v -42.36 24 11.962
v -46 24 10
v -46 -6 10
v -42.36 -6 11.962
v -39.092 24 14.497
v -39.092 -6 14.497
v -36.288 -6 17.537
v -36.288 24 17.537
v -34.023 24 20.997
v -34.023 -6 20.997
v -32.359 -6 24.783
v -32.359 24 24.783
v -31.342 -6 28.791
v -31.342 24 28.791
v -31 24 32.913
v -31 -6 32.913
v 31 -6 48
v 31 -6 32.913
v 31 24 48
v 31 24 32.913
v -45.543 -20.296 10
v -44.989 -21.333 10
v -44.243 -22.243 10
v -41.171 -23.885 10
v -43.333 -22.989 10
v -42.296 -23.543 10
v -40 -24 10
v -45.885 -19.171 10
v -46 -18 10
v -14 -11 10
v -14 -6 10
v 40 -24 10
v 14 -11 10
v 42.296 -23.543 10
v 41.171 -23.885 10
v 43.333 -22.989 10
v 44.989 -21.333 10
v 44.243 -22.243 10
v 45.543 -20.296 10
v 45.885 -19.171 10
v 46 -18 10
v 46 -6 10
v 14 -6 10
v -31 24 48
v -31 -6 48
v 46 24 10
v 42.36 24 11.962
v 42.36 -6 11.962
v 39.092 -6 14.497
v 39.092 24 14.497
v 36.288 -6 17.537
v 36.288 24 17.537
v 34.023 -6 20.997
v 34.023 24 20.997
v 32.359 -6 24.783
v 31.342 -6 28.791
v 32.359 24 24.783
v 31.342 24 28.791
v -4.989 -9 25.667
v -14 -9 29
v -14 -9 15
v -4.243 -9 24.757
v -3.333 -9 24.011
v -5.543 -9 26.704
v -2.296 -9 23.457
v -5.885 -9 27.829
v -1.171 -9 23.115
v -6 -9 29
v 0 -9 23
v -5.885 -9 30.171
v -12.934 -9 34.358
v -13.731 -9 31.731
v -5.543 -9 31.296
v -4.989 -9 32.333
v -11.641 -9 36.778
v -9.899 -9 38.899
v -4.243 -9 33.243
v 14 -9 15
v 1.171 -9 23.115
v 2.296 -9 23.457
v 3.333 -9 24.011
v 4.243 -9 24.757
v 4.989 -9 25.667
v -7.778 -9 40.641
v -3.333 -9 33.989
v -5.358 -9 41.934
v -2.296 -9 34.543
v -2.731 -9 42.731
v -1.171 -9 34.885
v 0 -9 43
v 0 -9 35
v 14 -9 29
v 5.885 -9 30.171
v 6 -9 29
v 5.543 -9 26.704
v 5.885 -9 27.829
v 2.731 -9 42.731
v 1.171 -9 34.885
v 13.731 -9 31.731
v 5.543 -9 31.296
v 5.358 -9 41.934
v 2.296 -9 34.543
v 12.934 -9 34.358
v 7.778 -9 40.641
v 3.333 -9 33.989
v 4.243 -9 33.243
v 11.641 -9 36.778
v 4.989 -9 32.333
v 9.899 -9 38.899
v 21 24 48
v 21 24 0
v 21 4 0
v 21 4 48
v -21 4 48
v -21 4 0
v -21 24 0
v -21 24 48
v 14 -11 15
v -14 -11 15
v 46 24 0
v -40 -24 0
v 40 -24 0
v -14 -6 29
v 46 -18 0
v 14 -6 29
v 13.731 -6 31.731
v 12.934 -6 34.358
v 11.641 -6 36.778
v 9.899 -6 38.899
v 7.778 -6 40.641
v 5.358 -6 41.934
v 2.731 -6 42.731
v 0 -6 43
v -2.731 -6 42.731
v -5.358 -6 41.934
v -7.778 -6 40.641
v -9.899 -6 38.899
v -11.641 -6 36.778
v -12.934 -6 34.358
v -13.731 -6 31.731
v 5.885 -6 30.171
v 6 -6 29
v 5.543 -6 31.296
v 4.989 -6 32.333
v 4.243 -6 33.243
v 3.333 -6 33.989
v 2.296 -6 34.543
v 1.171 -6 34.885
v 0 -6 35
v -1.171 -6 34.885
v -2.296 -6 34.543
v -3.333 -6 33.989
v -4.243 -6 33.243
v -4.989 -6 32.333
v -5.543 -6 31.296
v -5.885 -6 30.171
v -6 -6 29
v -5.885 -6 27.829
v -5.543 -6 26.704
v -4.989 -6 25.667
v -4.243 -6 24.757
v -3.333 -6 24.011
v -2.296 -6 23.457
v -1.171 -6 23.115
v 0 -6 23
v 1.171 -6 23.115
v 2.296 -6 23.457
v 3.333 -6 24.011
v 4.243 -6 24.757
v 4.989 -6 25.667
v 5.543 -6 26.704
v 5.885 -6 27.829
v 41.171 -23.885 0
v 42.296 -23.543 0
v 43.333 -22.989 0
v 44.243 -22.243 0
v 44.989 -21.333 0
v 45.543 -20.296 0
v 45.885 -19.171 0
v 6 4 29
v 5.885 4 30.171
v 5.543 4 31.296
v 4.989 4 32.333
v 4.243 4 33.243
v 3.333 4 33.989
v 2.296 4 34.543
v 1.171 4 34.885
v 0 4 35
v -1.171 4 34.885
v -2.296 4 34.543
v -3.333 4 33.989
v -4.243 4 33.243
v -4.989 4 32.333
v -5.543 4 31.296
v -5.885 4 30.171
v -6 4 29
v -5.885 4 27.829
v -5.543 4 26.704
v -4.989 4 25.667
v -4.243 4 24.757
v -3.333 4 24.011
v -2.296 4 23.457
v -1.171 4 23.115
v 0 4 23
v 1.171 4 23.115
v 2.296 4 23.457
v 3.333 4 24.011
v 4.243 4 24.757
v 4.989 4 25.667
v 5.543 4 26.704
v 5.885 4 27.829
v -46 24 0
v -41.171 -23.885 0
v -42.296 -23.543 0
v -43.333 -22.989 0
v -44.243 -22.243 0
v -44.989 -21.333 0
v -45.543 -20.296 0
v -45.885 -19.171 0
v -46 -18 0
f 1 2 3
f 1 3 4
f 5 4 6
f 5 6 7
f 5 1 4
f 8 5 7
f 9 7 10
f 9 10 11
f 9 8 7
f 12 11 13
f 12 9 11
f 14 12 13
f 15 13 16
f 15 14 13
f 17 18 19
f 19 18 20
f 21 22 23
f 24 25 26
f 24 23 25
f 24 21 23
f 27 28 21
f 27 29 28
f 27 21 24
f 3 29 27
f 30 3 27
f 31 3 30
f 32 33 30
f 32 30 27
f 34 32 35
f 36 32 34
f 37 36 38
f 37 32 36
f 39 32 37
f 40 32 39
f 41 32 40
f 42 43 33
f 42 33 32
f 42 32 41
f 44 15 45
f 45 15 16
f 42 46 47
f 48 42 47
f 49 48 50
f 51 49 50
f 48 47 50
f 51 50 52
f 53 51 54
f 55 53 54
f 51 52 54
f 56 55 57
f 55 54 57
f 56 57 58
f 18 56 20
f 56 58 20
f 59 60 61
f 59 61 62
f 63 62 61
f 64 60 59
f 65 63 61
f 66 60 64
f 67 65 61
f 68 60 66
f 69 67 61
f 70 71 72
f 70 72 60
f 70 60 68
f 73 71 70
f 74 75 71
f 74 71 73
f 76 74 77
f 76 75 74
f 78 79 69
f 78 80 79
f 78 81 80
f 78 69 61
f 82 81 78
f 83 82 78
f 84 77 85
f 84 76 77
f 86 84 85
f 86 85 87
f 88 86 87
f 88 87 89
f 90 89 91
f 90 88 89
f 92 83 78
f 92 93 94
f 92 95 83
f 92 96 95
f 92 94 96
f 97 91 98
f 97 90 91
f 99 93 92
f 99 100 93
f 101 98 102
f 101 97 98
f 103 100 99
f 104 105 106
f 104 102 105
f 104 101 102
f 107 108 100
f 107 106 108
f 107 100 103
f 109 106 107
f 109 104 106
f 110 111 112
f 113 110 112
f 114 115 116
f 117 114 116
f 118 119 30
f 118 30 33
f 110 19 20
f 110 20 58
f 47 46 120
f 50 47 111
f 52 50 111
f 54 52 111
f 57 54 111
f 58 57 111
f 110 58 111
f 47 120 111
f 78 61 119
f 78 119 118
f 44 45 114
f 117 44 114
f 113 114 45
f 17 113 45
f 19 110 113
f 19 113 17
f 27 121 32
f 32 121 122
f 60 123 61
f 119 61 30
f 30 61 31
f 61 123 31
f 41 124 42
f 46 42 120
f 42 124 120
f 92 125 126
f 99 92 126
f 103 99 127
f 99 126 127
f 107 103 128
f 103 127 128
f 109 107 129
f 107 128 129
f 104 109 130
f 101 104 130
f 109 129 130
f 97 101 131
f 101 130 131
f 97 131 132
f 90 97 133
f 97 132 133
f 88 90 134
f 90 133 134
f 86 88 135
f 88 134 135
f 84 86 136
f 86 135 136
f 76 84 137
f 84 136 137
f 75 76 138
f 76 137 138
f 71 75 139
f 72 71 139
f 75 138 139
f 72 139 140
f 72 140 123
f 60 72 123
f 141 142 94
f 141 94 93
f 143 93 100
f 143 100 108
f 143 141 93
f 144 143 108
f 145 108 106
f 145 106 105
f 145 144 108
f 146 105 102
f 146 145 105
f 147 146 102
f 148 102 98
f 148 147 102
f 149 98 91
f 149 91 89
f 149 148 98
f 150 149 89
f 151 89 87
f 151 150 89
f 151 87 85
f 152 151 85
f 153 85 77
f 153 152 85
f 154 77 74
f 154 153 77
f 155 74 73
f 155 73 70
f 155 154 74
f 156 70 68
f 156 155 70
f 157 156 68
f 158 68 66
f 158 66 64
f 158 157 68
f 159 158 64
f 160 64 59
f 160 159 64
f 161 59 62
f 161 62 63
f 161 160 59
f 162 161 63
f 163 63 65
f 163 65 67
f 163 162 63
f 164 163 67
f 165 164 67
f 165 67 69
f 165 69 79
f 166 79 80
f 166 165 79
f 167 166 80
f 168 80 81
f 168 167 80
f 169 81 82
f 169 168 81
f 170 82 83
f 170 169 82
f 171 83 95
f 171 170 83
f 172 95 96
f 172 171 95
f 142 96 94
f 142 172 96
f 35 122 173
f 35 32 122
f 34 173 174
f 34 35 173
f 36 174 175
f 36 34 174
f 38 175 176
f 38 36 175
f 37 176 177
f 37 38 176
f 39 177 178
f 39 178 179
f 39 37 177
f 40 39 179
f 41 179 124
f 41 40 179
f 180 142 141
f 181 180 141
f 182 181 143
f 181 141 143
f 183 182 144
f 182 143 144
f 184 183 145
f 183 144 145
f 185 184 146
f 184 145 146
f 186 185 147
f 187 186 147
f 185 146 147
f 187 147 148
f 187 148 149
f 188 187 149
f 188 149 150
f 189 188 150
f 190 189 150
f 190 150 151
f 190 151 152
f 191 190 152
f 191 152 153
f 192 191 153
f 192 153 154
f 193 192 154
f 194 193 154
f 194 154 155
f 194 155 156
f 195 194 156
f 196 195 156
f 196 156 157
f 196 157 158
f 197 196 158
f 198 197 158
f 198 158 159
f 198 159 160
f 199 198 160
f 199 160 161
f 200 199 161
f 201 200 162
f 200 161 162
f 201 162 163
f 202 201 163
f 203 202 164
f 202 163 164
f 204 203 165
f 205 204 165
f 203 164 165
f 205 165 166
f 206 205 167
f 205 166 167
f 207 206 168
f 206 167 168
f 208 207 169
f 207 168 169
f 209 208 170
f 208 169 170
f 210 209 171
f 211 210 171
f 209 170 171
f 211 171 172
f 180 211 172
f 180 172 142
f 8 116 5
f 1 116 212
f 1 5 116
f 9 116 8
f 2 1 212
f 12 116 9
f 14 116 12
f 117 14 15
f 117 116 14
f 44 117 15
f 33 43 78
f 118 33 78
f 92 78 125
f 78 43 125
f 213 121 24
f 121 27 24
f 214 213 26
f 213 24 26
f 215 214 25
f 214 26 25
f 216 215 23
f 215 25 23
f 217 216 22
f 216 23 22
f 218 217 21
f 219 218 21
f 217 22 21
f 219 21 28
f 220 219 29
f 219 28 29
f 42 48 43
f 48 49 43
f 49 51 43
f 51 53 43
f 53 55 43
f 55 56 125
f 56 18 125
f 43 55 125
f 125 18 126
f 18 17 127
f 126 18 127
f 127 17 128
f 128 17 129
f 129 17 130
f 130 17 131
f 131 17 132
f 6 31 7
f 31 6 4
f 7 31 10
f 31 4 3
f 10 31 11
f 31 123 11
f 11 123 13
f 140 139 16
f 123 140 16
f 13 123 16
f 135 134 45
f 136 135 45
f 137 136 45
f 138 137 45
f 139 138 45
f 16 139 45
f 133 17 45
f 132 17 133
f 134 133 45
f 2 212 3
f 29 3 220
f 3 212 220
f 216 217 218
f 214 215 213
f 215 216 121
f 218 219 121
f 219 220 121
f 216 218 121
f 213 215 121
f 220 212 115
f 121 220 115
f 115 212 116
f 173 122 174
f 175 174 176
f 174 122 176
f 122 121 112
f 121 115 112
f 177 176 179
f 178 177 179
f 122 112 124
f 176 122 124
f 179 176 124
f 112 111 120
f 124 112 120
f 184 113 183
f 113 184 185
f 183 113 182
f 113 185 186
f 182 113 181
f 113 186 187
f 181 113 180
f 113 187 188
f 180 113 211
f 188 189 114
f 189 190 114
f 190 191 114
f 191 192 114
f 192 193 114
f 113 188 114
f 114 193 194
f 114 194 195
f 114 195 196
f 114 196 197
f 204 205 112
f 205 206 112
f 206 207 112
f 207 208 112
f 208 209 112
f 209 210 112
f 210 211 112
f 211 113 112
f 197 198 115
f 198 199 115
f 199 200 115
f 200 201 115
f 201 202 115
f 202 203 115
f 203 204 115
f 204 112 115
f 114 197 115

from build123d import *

# Parameters (mm, degrees)
F1_DEPTH    = 48
F2_DEPTH    = 10
F3_R        = 6
F4_T1_DEPTH = 30
F5_W        = 28
F5_H        = 5
F6_DEPTH    = 5
F5_R        = 6
F7_DEPTH    = 3
F8_DEPTH    = 30.001


# Not quite as in the source:
# - a fillet or chamfer that OpenCascade refuses, or shapes differently, is made with other operations: its cross-section is extruded or revolved along the edge and cut away or added


with BuildPart() as f1:
    # F0 (on Top) → F1 (new body)
    with BuildSketch(Plane.XY):
        Polygon((31, -6), (31, 24), (21, 24), (21, 4), (-21, 4), (-21, 24), (-31, 24), (-31, -6), align=None)
    extrude(amount=F1_DEPTH)

    # F0 (on Top) → F2 (join)
    with BuildSketch(Plane.XY):
        Polygon((-46, -24), (46, -24), (46, 24), (31, 24), (31, -6), (-31, -6), (-31, 24), (-46, 24), align=None)
        Polygon((31, -6), (31, 24), (21, 24), (21, 4), (-21, 4), (-21, 24), (-31, 24), (-31, -6), align=None)
    extrude(amount=F2_DEPTH)

    # F3
    f3_edges = [f1.edges().sort_by_distance(p)[0] for p in [
        (-46, -24, 5),
        (46, -24, 5),
    ]]
    fillet(f3_edges, radius=F3_R)

    # F4: fillet of radius 25 on 2 edges, made by hand

    # F4_s2 → F4_t1 (join)
    with BuildSketch(Plane.XZ.offset(-24)):
        with BuildLine():
            ThreePointArc((-46, 10), (-35.0834993366, 19.2198145372), (-31, 32.9128784748))
            Line((-31, 32.9128784748), (-31, 10))
            Line((-31, 10), (-46, 10))
        make_face()
        with BuildLine():
            ThreePointArc((46, 10), (35.0834993366, 19.2198145372), (31, 32.9128784748))
            Line((31, 32.9128784748), (31, 10))
            Line((31, 10), (46, 10))
        make_face()
    extrude(amount=F4_T1_DEPTH)

    # F5 (on face) → F6 (join)
    with BuildSketch(Plane.XZ.offset(6)):
        with Locations((0, 12.5)):
            Rectangle(F5_W, F5_H)
    extrude(amount=F6_DEPTH)

    # F5 (on face) → F7 (join)
    with BuildSketch(Plane.XZ.offset(6)):
        with BuildLine():
            Line((14, 15), (14, 29))
            ThreePointArc((14, 29), (0, 43), (-14, 29))
            Line((-14, 29), (-14, 15))
            Line((-14, 15), (14, 15))
        make_face()
        with Locations((0, 29)):
            Circle(F5_R, mode=Mode.SUBTRACT)
    extrude(amount=F7_DEPTH)

    # F8 (cut, through all): a face of the model
    f8_faces = [f1.faces().sort_by_distance(p)[0] for p in [
        (0, -6, 29),
    ]]
    extrude(f8_faces, amount=-F8_DEPTH, mode=Mode.SUBTRACT)


solid = f1.part
